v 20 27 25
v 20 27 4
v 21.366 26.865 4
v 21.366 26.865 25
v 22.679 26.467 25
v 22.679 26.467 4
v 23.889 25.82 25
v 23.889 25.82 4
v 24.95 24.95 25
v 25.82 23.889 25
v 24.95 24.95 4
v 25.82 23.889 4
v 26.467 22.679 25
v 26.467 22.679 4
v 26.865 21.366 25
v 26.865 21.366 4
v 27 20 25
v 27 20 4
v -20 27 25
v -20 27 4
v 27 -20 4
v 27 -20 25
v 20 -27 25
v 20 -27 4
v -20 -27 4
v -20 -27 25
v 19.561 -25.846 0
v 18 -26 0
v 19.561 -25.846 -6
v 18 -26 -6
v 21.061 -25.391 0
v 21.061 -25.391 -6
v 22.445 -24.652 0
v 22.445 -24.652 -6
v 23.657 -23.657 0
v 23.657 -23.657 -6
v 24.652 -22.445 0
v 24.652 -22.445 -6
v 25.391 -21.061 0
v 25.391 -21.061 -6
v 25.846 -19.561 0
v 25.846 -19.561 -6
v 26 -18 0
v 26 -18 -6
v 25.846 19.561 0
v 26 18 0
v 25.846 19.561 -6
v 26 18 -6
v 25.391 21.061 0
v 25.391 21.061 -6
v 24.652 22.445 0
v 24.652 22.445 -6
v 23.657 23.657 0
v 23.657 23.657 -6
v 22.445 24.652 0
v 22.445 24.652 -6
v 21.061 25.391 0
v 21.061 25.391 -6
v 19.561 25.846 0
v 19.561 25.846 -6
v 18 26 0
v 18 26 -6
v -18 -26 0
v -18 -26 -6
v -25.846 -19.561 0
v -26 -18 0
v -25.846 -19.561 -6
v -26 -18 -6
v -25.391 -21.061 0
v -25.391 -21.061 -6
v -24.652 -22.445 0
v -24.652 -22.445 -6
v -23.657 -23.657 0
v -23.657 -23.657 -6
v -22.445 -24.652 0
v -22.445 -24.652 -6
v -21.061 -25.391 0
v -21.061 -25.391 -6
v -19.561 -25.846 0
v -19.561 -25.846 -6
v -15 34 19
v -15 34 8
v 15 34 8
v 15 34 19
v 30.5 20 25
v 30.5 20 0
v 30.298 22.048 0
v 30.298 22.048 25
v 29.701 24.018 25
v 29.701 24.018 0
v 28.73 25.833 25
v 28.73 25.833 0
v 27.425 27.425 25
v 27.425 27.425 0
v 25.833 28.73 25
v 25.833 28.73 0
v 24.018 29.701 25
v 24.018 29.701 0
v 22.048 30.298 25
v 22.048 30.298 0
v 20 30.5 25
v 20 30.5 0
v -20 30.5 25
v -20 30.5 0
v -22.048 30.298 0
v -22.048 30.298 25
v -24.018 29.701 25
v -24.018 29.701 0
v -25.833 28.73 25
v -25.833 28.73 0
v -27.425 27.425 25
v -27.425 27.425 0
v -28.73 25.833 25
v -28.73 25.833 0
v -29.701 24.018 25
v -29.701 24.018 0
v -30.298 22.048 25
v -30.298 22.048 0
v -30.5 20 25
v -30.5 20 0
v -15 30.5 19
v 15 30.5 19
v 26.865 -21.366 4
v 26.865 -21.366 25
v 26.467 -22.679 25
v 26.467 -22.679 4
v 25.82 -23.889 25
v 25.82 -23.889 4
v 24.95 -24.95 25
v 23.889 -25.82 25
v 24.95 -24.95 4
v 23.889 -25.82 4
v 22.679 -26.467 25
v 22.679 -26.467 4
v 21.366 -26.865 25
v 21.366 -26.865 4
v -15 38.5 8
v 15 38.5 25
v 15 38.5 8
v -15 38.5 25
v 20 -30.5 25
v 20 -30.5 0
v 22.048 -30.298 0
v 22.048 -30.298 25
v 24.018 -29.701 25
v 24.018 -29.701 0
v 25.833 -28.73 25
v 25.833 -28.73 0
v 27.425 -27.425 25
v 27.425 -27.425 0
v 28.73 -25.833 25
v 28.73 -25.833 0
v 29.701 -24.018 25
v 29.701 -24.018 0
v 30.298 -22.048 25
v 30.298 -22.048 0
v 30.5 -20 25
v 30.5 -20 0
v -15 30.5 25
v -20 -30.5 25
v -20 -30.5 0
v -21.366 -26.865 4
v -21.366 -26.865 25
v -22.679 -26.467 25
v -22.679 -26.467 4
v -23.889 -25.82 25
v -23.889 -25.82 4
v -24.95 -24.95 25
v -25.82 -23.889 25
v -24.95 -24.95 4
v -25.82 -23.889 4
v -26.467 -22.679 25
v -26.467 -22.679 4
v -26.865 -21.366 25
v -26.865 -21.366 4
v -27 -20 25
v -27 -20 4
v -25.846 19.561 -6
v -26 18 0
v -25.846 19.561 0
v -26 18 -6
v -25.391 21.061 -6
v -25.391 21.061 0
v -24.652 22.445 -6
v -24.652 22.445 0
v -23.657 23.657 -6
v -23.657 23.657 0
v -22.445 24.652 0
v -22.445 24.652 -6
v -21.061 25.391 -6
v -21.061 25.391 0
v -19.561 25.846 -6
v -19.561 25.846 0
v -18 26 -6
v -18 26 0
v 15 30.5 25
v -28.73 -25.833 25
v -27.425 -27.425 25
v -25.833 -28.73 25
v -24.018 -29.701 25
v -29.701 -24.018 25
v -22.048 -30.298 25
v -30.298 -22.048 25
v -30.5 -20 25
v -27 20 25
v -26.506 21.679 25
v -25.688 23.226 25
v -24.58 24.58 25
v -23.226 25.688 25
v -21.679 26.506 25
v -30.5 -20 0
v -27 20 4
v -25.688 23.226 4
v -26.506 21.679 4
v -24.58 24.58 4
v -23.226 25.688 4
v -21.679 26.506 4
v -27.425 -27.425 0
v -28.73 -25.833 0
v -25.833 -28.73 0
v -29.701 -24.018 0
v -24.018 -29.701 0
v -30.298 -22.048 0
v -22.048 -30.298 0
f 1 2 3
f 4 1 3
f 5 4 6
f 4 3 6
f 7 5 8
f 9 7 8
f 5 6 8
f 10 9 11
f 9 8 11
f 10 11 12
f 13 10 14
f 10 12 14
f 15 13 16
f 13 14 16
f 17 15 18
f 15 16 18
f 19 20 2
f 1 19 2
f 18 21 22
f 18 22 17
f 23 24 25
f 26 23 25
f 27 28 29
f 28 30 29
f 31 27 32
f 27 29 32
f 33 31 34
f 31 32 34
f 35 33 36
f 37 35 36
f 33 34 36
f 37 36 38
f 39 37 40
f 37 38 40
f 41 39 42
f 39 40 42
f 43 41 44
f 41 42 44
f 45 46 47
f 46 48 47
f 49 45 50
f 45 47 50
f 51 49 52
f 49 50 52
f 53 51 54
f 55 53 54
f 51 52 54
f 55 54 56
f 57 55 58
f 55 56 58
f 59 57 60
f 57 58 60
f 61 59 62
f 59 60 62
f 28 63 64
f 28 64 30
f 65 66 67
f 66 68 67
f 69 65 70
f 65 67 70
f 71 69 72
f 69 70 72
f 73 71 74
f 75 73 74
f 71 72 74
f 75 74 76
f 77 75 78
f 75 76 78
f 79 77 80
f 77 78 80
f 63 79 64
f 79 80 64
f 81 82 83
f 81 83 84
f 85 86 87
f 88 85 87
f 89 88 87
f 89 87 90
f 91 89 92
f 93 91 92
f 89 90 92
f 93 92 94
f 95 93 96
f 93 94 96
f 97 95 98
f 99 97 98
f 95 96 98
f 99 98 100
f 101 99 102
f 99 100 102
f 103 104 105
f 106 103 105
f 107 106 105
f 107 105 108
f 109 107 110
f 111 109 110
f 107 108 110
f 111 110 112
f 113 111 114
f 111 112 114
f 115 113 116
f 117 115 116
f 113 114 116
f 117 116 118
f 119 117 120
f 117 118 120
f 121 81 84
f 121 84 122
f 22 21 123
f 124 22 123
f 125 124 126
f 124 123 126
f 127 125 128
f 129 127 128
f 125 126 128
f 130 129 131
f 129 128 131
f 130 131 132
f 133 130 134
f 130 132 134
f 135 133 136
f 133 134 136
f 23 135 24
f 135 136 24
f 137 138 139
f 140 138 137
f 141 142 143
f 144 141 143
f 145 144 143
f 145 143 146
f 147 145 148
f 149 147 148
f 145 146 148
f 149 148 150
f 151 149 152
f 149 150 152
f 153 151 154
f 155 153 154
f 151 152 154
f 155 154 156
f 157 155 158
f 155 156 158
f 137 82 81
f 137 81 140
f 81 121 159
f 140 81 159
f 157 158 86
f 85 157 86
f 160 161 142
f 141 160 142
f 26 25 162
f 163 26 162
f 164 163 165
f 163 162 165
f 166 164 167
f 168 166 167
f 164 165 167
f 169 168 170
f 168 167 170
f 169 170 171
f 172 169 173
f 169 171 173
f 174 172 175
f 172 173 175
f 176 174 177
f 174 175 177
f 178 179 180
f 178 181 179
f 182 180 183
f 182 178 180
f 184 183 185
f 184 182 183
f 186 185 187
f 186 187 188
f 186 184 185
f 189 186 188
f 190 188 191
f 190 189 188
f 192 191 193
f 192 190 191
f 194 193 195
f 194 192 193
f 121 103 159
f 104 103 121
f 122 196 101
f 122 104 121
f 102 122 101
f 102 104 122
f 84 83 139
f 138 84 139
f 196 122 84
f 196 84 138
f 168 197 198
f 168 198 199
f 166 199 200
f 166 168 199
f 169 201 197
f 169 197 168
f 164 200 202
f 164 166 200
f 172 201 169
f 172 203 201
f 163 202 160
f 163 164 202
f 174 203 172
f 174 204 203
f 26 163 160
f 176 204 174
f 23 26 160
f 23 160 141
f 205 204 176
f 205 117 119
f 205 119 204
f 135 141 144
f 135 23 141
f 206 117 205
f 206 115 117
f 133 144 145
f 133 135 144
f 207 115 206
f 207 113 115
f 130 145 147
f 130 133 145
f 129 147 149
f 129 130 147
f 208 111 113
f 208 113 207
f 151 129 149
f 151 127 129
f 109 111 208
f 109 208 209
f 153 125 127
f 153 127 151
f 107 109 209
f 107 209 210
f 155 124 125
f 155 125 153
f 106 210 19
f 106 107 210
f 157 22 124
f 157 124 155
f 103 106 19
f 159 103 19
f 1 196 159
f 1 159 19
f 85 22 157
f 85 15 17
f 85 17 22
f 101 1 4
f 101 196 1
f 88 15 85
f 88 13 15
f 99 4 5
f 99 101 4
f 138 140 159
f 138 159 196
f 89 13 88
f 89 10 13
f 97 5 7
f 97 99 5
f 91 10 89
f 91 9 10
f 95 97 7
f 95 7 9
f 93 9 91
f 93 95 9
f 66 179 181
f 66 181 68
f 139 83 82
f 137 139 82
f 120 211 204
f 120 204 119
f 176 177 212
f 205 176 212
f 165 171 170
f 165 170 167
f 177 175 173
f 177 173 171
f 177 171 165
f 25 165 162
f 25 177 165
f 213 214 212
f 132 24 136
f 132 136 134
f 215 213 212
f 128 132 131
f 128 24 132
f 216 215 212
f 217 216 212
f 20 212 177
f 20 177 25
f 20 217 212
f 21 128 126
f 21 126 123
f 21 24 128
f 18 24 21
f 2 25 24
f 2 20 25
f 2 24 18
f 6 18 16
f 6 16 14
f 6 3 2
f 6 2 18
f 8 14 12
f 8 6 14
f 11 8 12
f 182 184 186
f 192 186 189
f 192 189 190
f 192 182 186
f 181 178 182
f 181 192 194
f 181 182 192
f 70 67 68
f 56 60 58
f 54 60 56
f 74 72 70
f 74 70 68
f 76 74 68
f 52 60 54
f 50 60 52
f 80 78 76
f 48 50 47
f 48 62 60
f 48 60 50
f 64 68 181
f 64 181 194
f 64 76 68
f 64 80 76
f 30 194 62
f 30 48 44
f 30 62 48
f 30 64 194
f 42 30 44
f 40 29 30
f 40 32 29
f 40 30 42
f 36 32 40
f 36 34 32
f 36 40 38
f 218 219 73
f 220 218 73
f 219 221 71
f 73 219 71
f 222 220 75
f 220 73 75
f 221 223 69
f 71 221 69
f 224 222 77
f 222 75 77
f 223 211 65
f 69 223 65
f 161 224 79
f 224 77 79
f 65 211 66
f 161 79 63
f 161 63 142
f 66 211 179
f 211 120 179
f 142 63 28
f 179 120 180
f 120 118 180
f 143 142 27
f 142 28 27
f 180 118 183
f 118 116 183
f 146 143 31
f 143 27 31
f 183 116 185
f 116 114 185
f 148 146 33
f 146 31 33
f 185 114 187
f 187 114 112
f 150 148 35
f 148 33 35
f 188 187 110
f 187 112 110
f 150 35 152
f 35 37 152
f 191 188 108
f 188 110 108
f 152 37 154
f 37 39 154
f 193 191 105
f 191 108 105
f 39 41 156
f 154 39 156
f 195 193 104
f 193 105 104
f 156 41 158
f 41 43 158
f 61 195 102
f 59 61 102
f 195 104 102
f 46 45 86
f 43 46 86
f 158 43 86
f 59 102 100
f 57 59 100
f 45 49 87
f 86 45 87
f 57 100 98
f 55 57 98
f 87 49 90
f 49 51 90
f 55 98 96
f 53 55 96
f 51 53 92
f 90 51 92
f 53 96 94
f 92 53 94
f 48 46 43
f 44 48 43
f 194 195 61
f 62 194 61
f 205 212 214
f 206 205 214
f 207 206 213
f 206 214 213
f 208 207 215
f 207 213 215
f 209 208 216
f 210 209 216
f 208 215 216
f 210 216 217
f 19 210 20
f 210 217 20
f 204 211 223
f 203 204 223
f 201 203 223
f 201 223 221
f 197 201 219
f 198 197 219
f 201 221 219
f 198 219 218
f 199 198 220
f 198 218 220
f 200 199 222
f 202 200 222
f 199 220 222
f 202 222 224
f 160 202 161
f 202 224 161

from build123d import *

# Parameters (mm, degrees)
F0_W     = 7
F0_H     = 40
F0_W_2   = 40
F0_H_2   = 7
F1_DEPTH = 4
F0_H_3   = 3.5
F0_W_3   = 3.5
F2_DEPTH = 25
F3_W     = 30
F3_H     = 17
F4_DEPTH = 8
F5_W     = 3.5
F5_H     = 11
F6_DEPTH = 33
F7_W     = 52
F7_H     = 52
F8_DEPTH = 6
F9_R     = 8


with BuildPart() as f1:
    # F0 (on Top) → F1 (new body)
    with BuildSketch(Plane.XY):
        with Locations((-23.5, 0)):
            Rectangle(F0_W, F0_H)
        with BuildLine():
            Line((-27, 20), (-20, 20))
            Line((-20, 20), (-20, 27))
            ThreePointArc((-20, 27), (-24.5803009352, 24.5803009352), (-27, 20))
        make_face()
        with Locations((0, 23.5)):
            Rectangle(F0_W_2, F0_H_2)
        Rectangle(F0_W_2, F0_H)
        with BuildLine():
            Line((20, 20), (27, 20))
            ThreePointArc((27, 20), (24.9497474683, 24.9497474683), (20, 27))
            Line((20, 27), (20, 20))
        make_face()
        with Locations((23.5, 0)):
            Rectangle(F0_W, F0_H)
        with Locations((0, -23.5)):
            Rectangle(F0_W_2, F0_H_2)
        with BuildLine():
            Line((20, -20), (20, -27))
            ThreePointArc((20, -27), (24.9497474683, -24.9497474683), (27, -20))
            Line((27, -20), (20, -20))
        make_face()
        with BuildLine():
            ThreePointArc((-27, -20), (-24.9497474683, -24.9497474683), (-20, -27))
            Line((-20, -27), (-20, -20))
            Line((-20, -20), (-27, -20))
        make_face()
    extrude(amount=F1_DEPTH)

    # F0 (on Top) → F2 (join)
    with BuildSketch(Plane.XY):
        with BuildLine():
            Line((20, -27), (20, -30.5))
            ThreePointArc((20, -30.5), (27.4246212025, -27.4246212025), (30.5, -20))
            Line((30.5, -20), (27, -20))
            Line((27, -20), (27, -27))
            Line((27, -27), (20, -27))
        make_face()
        with BuildLine():
            ThreePointArc((27, -20), (24.9497474683, -24.9497474683), (20, -27))
            Line((20, -27), (27, -27))
            Line((27, -27), (27, -20))
        make_face()
        with Locations((0, -28.75)):
            Rectangle(F0_W_2, F0_H_3)
        with BuildLine():
            ThreePointArc((-30.5, -20), (-27.4246212025, -27.4246212025), (-20, -30.5))
            Line((-20, -30.5), (-20, -27))
            Line((-20, -27), (-27, -27))
            Line((-27, -27), (-27, -20))
            Line((-27, -20), (-30.5, -20))
        make_face()
        with BuildLine():
            Line((-27, -27), (-20, -27))
            ThreePointArc((-20, -27), (-24.9497474683, -24.9497474683), (-27, -20))
            Line((-27, -20), (-27, -27))
        make_face()
        with Locations((-28.75, 0)):
            Rectangle(F0_W_3, F0_H)
        with BuildLine():
            ThreePointArc((-20, 30.5), (-27.4246212025, 27.4246212025), (-30.5, 20))
            Line((-30.5, 20), (-27, 20))
            Line((-27, 20), (-27, 27))
            Line((-27, 27), (-20, 27))
            Line((-20, 27), (-20, 30.5))
        make_face()
        with BuildLine():
            Line((-27, 27), (-27, 20))
            ThreePointArc((-27, 20), (-24.5803009352, 24.5803009352), (-20, 27))
            Line((-20, 27), (-27, 27))
        make_face()
        with Locations((0, 28.75)):
            Rectangle(F0_W_2, F0_H_3)
        with BuildLine():
            Line((27, 20), (30.5, 20))
            ThreePointArc((30.5, 20), (27.4246212025, 27.4246212025), (20, 30.5))
            Line((20, 30.5), (20, 27))
            Line((20, 27), (27, 27))
            Line((27, 27), (27, 20))
        make_face()
        with BuildLine():
            ThreePointArc((20, 27), (24.9497474683, 24.9497474683), (27, 20))
            Line((27, 20), (27, 27))
            Line((27, 27), (20, 27))
        make_face()
        with Locations((28.75, 0)):
            Rectangle(F0_W_3, F0_H)
    extrude(amount=F2_DEPTH)

    # F3 (on face) → F4 (join)
    with BuildSketch(Plane(origin=(0, 30.5, 0), x_dir=(-1, 0, 0), z_dir=(0, 1, 0))):
        with Locations((0, 16.5)):
            Rectangle(F3_W, F3_H)
    extrude(amount=F4_DEPTH)

    # F5 (on face) → F6 (cut)
    with BuildSketch(Plane(origin=(-15, 0, 0), x_dir=(0, -1, 0), z_dir=(-1, 0, 0))):
        with Locations((-32.25, 13.5)):
            Rectangle(F5_W, F5_H)
    extrude(amount=-F6_DEPTH, mode=Mode.SUBTRACT)

    # F7 (on face) → F8 (join)
    with BuildSketch(Plane(origin=(0, 0, 0), x_dir=(1, 0, 0), z_dir=(0, 0, -1))):
        Rectangle(F7_W, F7_H)
    extrude(amount=F8_DEPTH)

    # F9
    f9_edges = [f1.edges().sort_by_distance(p)[0] for p in [
        (-26, -26, -3),
        (26, -26, -3),
        (26, 26, -3),
        (-26, 26, -3),
    ]]
    fillet(f9_edges, radius=F9_R)


solid = f1.part
